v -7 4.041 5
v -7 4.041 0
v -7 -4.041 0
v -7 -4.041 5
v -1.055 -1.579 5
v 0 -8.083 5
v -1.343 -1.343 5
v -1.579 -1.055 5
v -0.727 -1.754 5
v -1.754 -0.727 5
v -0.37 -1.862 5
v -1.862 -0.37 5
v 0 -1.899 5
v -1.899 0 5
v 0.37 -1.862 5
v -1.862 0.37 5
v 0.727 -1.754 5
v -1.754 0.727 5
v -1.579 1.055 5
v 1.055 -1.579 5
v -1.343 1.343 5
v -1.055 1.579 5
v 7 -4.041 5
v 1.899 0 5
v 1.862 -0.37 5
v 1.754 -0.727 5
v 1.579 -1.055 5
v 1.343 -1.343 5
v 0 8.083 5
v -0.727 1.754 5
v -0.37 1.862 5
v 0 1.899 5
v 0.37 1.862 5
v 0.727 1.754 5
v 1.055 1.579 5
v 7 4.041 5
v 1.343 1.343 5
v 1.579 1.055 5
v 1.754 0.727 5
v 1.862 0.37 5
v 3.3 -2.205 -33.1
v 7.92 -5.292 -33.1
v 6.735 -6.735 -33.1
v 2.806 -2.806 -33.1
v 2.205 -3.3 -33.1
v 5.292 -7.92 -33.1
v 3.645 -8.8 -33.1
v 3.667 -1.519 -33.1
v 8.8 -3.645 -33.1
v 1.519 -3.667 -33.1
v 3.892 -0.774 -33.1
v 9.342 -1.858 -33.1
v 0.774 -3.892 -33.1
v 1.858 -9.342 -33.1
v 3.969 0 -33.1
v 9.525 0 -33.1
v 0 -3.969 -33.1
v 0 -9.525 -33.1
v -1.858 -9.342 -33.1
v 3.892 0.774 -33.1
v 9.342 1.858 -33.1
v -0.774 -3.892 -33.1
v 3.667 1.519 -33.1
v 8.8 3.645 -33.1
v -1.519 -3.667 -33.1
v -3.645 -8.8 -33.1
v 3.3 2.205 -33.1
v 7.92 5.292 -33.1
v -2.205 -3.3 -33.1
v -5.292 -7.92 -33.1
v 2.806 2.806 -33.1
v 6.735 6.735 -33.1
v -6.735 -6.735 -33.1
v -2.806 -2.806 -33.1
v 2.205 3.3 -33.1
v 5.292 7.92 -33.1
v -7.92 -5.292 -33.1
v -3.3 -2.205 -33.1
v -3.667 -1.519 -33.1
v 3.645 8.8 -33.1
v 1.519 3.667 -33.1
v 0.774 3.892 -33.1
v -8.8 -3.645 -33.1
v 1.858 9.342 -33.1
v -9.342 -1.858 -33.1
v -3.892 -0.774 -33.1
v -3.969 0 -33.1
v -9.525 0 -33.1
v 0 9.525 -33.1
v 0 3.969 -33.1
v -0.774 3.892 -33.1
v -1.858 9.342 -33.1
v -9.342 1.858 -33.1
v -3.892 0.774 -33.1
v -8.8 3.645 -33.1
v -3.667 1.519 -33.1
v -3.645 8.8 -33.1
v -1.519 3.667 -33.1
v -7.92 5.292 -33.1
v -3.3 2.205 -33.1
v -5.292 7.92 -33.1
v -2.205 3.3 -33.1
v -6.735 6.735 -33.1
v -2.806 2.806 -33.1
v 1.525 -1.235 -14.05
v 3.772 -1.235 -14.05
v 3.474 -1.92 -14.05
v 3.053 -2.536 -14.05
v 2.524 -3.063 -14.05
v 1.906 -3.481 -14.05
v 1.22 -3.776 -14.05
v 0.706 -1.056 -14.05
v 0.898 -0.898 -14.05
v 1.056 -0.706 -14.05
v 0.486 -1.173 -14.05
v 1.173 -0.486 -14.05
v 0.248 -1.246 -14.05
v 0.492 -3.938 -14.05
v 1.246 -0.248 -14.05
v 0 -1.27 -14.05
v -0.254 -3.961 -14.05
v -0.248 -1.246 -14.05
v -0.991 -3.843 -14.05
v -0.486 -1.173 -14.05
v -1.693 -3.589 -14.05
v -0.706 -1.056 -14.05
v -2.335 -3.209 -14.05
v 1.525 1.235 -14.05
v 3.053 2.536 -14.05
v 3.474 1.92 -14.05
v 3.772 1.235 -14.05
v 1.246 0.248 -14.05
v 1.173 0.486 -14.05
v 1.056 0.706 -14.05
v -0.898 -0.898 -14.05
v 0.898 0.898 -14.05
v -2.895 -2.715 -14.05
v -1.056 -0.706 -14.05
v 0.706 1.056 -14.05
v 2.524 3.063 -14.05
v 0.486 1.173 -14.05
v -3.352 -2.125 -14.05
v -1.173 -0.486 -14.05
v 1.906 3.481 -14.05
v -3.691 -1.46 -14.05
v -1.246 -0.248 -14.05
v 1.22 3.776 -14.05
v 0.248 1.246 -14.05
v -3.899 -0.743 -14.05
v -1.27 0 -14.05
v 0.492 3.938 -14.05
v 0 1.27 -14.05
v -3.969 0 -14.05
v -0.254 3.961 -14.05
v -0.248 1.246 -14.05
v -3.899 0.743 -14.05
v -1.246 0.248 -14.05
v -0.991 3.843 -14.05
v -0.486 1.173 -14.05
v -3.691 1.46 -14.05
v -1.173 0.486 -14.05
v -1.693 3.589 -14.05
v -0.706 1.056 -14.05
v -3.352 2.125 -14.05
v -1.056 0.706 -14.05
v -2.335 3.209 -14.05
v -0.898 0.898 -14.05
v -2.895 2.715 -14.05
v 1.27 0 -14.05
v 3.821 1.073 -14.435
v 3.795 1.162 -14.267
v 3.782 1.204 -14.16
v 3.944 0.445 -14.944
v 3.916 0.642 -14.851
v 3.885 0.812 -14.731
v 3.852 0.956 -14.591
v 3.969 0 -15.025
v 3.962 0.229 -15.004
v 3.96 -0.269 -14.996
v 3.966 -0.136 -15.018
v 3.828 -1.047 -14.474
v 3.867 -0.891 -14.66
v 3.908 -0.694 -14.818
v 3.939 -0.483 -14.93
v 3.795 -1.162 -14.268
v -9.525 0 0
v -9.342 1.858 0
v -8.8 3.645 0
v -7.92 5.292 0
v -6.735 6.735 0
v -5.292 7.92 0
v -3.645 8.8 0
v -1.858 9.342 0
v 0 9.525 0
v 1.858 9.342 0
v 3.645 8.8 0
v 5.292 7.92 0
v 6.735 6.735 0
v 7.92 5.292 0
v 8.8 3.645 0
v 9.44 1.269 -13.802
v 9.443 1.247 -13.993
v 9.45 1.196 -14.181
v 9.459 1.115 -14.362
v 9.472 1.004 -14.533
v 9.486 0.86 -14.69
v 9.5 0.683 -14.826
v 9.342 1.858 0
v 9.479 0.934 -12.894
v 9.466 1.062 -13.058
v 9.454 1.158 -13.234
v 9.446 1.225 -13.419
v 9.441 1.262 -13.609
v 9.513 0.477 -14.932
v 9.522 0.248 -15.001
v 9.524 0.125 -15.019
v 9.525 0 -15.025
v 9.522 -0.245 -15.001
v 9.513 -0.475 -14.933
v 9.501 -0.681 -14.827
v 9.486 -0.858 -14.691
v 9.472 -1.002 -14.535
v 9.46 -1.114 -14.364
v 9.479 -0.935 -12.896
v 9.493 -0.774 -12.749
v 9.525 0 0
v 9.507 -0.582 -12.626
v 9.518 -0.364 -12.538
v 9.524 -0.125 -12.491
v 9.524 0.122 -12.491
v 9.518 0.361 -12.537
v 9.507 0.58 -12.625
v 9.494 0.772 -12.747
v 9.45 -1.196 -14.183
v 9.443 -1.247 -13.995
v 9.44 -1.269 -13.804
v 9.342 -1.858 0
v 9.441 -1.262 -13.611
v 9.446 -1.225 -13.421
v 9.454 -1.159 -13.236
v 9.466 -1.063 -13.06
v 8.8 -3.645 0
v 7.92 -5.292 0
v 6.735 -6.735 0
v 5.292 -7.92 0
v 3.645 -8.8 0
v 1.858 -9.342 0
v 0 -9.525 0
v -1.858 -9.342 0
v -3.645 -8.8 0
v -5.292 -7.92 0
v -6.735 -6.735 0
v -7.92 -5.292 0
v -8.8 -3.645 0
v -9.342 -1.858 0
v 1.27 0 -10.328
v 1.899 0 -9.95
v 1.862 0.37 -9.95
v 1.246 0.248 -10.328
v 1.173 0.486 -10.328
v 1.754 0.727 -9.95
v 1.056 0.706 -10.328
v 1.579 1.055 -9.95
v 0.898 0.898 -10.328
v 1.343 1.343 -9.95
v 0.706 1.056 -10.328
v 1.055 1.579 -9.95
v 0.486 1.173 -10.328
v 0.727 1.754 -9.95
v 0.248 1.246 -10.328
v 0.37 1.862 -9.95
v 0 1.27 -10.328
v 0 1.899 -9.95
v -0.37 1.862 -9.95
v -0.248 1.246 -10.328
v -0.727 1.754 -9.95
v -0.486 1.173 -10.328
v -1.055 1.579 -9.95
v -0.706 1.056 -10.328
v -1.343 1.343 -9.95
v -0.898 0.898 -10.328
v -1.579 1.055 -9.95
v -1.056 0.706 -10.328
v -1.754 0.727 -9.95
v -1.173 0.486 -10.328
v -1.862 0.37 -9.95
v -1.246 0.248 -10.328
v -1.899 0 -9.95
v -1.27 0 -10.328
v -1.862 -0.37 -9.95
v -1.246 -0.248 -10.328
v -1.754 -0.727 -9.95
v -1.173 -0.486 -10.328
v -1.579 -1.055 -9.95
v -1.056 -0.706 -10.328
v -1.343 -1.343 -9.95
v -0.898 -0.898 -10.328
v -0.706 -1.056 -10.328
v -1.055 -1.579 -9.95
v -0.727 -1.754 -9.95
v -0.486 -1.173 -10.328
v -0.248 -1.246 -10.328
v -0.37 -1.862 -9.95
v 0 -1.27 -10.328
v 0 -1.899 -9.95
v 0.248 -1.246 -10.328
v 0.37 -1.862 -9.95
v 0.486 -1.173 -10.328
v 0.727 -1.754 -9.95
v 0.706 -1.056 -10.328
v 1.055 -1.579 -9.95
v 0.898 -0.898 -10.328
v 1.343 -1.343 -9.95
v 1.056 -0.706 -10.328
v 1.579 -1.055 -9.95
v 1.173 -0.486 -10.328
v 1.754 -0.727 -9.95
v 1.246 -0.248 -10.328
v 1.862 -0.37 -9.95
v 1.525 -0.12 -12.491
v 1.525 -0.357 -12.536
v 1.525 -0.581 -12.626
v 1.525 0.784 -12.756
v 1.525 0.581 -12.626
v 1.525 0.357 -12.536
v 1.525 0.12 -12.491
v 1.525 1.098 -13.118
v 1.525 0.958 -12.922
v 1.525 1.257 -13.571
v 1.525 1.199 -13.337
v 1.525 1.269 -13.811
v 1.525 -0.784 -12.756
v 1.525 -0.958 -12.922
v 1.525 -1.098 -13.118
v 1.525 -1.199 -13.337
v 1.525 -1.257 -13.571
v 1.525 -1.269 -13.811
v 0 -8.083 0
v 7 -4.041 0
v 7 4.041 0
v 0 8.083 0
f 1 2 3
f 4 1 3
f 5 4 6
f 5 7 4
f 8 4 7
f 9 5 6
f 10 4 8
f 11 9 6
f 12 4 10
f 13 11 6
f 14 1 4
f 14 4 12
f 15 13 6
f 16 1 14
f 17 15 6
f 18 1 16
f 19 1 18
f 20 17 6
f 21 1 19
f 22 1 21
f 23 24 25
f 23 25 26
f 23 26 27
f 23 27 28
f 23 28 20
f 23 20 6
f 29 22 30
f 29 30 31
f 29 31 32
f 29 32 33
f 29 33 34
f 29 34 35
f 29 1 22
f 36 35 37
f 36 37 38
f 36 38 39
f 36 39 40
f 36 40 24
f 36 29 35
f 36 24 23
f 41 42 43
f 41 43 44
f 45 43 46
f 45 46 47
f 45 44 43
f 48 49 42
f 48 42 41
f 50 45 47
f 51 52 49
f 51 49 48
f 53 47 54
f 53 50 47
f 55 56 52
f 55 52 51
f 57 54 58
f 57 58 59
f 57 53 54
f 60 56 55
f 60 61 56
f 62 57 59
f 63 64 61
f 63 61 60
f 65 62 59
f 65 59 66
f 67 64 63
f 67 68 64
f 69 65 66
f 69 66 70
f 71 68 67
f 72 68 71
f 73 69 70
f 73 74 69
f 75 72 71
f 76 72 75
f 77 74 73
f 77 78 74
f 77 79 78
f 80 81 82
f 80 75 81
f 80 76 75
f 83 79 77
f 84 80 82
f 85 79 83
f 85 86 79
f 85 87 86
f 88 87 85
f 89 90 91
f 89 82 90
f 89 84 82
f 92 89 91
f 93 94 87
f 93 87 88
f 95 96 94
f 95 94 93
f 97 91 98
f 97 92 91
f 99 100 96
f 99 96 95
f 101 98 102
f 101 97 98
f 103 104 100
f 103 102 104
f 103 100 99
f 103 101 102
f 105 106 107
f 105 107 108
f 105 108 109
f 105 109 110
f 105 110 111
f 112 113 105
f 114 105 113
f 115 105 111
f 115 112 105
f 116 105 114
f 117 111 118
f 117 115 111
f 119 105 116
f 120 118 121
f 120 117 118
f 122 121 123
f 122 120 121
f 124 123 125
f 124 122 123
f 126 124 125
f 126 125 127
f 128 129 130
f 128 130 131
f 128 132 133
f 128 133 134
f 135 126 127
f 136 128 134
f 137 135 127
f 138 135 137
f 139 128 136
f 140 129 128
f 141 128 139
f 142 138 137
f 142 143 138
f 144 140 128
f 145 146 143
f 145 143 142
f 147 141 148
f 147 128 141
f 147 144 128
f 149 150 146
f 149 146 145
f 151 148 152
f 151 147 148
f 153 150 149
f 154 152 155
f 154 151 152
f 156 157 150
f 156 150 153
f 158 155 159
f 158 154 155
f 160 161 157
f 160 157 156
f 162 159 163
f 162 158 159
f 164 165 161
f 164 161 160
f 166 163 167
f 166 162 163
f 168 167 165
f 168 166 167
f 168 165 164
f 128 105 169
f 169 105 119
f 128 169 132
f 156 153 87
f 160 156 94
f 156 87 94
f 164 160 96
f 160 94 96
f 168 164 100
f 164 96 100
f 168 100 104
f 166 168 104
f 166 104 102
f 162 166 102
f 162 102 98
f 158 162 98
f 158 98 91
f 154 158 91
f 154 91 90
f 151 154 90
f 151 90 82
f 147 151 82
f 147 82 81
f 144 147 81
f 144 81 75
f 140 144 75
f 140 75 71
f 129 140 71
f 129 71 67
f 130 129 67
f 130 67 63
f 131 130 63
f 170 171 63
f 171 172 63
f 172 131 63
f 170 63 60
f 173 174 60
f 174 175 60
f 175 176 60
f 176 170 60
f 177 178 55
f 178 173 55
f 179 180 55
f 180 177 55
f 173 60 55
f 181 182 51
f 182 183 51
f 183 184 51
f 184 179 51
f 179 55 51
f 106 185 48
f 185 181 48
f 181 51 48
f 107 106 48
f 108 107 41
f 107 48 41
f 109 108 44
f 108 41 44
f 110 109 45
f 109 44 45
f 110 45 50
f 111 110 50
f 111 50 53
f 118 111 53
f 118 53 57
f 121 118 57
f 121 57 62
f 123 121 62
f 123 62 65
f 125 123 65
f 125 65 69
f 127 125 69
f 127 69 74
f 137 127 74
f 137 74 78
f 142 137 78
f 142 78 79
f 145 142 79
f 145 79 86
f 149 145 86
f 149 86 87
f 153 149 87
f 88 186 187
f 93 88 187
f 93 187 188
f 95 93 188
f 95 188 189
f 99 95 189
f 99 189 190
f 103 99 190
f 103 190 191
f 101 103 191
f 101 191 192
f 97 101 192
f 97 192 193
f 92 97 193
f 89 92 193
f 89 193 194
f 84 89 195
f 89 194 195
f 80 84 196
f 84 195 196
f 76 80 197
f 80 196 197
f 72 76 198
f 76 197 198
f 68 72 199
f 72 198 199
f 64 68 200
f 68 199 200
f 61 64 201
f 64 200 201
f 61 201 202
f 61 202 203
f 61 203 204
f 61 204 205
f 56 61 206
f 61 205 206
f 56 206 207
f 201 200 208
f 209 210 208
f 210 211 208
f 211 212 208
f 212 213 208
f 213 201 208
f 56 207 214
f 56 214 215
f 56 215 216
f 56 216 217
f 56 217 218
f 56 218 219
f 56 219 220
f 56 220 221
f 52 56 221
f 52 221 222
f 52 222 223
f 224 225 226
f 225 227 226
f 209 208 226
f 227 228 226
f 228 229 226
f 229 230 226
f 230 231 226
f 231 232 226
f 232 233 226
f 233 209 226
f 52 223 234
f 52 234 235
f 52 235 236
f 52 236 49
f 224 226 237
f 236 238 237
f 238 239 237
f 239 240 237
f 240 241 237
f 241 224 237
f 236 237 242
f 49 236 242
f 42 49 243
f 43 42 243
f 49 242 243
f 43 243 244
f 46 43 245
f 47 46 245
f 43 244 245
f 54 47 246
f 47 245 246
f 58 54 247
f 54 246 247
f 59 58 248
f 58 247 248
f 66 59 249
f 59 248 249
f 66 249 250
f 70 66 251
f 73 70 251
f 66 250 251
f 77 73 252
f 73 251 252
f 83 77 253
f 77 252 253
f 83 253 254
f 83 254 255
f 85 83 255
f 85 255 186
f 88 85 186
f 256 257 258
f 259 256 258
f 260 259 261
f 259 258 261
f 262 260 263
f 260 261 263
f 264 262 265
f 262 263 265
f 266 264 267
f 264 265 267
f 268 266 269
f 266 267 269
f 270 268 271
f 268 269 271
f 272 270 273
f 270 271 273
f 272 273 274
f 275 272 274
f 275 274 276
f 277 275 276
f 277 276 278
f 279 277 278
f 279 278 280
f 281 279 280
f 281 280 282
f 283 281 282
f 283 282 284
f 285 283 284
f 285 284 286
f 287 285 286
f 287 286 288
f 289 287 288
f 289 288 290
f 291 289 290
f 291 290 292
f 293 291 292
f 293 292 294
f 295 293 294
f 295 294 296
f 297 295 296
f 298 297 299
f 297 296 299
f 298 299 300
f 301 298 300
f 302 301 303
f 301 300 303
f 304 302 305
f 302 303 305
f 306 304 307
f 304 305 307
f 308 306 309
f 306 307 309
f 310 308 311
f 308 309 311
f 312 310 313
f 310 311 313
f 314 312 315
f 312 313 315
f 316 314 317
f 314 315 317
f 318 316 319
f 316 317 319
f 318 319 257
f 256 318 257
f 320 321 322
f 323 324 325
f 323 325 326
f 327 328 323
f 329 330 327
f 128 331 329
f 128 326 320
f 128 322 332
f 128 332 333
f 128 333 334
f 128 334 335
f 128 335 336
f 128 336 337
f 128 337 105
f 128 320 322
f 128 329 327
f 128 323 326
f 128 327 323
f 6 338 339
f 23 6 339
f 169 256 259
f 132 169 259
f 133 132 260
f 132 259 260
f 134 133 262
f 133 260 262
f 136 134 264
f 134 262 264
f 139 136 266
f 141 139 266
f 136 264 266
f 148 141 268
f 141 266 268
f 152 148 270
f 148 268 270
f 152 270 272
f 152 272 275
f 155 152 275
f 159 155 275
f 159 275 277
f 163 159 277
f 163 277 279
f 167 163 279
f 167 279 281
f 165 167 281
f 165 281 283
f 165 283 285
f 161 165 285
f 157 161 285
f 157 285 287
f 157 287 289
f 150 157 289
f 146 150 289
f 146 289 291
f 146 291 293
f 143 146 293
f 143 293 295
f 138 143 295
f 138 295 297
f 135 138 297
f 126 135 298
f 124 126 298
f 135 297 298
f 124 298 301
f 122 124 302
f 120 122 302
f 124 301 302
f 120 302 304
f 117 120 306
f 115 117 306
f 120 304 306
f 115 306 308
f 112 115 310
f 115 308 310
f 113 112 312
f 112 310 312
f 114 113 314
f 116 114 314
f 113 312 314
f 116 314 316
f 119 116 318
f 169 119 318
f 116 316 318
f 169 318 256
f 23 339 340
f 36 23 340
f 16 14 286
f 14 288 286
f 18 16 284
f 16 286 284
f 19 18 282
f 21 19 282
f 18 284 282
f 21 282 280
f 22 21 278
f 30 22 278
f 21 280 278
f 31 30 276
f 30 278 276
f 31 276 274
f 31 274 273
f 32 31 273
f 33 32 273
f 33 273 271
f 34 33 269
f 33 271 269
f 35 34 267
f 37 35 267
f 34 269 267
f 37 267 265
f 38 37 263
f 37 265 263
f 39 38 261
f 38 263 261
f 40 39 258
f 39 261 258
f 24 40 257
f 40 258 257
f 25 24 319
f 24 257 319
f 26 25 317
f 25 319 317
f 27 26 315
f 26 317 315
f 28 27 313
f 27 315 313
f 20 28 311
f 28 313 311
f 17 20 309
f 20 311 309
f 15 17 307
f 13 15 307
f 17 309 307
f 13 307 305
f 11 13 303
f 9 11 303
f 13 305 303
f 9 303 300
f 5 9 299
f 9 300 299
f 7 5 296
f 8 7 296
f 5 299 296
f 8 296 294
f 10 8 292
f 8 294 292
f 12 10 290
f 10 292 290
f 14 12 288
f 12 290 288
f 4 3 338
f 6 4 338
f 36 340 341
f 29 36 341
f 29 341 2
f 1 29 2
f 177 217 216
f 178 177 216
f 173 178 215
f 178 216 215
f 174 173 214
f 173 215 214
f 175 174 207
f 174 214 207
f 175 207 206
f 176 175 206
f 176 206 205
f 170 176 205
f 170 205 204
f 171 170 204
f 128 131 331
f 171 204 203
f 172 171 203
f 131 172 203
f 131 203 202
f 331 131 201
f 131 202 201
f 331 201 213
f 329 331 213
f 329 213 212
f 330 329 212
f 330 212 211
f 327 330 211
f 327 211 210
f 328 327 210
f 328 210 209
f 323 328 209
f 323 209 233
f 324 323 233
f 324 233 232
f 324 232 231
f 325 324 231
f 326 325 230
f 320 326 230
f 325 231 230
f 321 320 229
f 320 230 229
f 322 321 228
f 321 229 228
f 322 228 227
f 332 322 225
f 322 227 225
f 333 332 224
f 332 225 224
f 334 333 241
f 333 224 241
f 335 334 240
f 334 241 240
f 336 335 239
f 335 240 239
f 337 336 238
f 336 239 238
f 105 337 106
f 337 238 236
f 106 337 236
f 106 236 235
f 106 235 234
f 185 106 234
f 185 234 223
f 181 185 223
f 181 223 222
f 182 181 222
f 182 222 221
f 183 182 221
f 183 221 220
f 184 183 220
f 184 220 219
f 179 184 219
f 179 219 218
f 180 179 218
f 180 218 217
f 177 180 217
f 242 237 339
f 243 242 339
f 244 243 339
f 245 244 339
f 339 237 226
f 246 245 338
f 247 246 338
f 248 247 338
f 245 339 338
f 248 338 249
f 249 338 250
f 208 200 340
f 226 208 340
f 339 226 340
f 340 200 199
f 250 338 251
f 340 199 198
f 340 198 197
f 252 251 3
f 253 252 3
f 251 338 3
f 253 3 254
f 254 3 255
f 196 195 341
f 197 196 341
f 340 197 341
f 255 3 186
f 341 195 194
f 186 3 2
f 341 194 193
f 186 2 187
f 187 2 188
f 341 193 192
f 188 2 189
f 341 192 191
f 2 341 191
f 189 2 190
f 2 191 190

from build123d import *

# Parameters (mm, degrees)
BOSS_EXTRUDE2_DEPTH        = 5
SKETCH2_R                  = 9.525
BOSS_EXTRUDE3_DEPTH        = 33.1
SKETCH3_R                  = 3.96875
CUT_EXTRUDE1_DEPTH         = 19.05
SKETCH4_R                  = 1.27
CUT_EXTRUDE2_DEPTH         = 19.05
F_10_24_TAPPED_HOLE1_D     = 3.7973
F_10_24_TAPPED_HOLE1_DEPTH = 14.95
F_10_24_TAPPED_HOLE1_TIP   = 1.140824014
SKETCH6_R                  = 1.27
CUT_EXTRUDE3_DEPTH         = 8


with BuildPart() as part:
    # Sketch1 → Boss-Extrude2 (new body)
    with BuildSketch(Plane.XY):
        Polygon((0, 8.082903769), (-7, 4.041451884), (-7, -4.041451884), (0, -8.082903769), (7, -4.041451884), (7, 4.041451884), align=None)
    extrude(amount=BOSS_EXTRUDE2_DEPTH)

    # Sketch2 → Boss-Extrude3 (add)
    with BuildSketch(Plane(origin=(0, 0, 0), x_dir=(-1, 0, 0), z_dir=(0, 0, -1))):
        Circle(SKETCH2_R)
    extrude(amount=BOSS_EXTRUDE3_DEPTH)

    # Sketch3 → Cut-Extrude1 (cut)
    with BuildSketch(Plane(origin=(0, 0, -33.1), x_dir=(-1, 0, 0), z_dir=(0, 0, -1))):
        Circle(SKETCH3_R)
    extrude(amount=-CUT_EXTRUDE1_DEPTH, mode=Mode.SUBTRACT)

    # Sketch4 → Cut-Extrude2 (cut)
    with BuildSketch(Plane.XY.offset(5)):
        Circle(SKETCH4_R)
    extrude(amount=-CUT_EXTRUDE2_DEPTH, mode=Mode.SUBTRACT)

    # #10-24 Tapped Hole1
    with Locations(Plane.XY.offset(5)):
        with Locations((0, 0)):
            Hole(F_10_24_TAPPED_HOLE1_D / 2, depth=F_10_24_TAPPED_HOLE1_DEPTH)
            with Locations((0, 0, -(F_10_24_TAPPED_HOLE1_DEPTH + F_10_24_TAPPED_HOLE1_TIP / 2))):  # 118° drill point
                Cone(0, F_10_24_TAPPED_HOLE1_D / 2, F_10_24_TAPPED_HOLE1_TIP, mode=Mode.SUBTRACT)

    # Sketch6 → Cut-Extrude3 (cut)
    with BuildSketch(Plane(origin=(9.525, 0, 0), x_dir=(0, 0, -1), z_dir=(1, 0, 0))):
        with Locations((13.755140778, 0)):
            Circle(SKETCH6_R)
    extrude(amount=-CUT_EXTRUDE3_DEPTH, mode=Mode.SUBTRACT)


solid = part.part
